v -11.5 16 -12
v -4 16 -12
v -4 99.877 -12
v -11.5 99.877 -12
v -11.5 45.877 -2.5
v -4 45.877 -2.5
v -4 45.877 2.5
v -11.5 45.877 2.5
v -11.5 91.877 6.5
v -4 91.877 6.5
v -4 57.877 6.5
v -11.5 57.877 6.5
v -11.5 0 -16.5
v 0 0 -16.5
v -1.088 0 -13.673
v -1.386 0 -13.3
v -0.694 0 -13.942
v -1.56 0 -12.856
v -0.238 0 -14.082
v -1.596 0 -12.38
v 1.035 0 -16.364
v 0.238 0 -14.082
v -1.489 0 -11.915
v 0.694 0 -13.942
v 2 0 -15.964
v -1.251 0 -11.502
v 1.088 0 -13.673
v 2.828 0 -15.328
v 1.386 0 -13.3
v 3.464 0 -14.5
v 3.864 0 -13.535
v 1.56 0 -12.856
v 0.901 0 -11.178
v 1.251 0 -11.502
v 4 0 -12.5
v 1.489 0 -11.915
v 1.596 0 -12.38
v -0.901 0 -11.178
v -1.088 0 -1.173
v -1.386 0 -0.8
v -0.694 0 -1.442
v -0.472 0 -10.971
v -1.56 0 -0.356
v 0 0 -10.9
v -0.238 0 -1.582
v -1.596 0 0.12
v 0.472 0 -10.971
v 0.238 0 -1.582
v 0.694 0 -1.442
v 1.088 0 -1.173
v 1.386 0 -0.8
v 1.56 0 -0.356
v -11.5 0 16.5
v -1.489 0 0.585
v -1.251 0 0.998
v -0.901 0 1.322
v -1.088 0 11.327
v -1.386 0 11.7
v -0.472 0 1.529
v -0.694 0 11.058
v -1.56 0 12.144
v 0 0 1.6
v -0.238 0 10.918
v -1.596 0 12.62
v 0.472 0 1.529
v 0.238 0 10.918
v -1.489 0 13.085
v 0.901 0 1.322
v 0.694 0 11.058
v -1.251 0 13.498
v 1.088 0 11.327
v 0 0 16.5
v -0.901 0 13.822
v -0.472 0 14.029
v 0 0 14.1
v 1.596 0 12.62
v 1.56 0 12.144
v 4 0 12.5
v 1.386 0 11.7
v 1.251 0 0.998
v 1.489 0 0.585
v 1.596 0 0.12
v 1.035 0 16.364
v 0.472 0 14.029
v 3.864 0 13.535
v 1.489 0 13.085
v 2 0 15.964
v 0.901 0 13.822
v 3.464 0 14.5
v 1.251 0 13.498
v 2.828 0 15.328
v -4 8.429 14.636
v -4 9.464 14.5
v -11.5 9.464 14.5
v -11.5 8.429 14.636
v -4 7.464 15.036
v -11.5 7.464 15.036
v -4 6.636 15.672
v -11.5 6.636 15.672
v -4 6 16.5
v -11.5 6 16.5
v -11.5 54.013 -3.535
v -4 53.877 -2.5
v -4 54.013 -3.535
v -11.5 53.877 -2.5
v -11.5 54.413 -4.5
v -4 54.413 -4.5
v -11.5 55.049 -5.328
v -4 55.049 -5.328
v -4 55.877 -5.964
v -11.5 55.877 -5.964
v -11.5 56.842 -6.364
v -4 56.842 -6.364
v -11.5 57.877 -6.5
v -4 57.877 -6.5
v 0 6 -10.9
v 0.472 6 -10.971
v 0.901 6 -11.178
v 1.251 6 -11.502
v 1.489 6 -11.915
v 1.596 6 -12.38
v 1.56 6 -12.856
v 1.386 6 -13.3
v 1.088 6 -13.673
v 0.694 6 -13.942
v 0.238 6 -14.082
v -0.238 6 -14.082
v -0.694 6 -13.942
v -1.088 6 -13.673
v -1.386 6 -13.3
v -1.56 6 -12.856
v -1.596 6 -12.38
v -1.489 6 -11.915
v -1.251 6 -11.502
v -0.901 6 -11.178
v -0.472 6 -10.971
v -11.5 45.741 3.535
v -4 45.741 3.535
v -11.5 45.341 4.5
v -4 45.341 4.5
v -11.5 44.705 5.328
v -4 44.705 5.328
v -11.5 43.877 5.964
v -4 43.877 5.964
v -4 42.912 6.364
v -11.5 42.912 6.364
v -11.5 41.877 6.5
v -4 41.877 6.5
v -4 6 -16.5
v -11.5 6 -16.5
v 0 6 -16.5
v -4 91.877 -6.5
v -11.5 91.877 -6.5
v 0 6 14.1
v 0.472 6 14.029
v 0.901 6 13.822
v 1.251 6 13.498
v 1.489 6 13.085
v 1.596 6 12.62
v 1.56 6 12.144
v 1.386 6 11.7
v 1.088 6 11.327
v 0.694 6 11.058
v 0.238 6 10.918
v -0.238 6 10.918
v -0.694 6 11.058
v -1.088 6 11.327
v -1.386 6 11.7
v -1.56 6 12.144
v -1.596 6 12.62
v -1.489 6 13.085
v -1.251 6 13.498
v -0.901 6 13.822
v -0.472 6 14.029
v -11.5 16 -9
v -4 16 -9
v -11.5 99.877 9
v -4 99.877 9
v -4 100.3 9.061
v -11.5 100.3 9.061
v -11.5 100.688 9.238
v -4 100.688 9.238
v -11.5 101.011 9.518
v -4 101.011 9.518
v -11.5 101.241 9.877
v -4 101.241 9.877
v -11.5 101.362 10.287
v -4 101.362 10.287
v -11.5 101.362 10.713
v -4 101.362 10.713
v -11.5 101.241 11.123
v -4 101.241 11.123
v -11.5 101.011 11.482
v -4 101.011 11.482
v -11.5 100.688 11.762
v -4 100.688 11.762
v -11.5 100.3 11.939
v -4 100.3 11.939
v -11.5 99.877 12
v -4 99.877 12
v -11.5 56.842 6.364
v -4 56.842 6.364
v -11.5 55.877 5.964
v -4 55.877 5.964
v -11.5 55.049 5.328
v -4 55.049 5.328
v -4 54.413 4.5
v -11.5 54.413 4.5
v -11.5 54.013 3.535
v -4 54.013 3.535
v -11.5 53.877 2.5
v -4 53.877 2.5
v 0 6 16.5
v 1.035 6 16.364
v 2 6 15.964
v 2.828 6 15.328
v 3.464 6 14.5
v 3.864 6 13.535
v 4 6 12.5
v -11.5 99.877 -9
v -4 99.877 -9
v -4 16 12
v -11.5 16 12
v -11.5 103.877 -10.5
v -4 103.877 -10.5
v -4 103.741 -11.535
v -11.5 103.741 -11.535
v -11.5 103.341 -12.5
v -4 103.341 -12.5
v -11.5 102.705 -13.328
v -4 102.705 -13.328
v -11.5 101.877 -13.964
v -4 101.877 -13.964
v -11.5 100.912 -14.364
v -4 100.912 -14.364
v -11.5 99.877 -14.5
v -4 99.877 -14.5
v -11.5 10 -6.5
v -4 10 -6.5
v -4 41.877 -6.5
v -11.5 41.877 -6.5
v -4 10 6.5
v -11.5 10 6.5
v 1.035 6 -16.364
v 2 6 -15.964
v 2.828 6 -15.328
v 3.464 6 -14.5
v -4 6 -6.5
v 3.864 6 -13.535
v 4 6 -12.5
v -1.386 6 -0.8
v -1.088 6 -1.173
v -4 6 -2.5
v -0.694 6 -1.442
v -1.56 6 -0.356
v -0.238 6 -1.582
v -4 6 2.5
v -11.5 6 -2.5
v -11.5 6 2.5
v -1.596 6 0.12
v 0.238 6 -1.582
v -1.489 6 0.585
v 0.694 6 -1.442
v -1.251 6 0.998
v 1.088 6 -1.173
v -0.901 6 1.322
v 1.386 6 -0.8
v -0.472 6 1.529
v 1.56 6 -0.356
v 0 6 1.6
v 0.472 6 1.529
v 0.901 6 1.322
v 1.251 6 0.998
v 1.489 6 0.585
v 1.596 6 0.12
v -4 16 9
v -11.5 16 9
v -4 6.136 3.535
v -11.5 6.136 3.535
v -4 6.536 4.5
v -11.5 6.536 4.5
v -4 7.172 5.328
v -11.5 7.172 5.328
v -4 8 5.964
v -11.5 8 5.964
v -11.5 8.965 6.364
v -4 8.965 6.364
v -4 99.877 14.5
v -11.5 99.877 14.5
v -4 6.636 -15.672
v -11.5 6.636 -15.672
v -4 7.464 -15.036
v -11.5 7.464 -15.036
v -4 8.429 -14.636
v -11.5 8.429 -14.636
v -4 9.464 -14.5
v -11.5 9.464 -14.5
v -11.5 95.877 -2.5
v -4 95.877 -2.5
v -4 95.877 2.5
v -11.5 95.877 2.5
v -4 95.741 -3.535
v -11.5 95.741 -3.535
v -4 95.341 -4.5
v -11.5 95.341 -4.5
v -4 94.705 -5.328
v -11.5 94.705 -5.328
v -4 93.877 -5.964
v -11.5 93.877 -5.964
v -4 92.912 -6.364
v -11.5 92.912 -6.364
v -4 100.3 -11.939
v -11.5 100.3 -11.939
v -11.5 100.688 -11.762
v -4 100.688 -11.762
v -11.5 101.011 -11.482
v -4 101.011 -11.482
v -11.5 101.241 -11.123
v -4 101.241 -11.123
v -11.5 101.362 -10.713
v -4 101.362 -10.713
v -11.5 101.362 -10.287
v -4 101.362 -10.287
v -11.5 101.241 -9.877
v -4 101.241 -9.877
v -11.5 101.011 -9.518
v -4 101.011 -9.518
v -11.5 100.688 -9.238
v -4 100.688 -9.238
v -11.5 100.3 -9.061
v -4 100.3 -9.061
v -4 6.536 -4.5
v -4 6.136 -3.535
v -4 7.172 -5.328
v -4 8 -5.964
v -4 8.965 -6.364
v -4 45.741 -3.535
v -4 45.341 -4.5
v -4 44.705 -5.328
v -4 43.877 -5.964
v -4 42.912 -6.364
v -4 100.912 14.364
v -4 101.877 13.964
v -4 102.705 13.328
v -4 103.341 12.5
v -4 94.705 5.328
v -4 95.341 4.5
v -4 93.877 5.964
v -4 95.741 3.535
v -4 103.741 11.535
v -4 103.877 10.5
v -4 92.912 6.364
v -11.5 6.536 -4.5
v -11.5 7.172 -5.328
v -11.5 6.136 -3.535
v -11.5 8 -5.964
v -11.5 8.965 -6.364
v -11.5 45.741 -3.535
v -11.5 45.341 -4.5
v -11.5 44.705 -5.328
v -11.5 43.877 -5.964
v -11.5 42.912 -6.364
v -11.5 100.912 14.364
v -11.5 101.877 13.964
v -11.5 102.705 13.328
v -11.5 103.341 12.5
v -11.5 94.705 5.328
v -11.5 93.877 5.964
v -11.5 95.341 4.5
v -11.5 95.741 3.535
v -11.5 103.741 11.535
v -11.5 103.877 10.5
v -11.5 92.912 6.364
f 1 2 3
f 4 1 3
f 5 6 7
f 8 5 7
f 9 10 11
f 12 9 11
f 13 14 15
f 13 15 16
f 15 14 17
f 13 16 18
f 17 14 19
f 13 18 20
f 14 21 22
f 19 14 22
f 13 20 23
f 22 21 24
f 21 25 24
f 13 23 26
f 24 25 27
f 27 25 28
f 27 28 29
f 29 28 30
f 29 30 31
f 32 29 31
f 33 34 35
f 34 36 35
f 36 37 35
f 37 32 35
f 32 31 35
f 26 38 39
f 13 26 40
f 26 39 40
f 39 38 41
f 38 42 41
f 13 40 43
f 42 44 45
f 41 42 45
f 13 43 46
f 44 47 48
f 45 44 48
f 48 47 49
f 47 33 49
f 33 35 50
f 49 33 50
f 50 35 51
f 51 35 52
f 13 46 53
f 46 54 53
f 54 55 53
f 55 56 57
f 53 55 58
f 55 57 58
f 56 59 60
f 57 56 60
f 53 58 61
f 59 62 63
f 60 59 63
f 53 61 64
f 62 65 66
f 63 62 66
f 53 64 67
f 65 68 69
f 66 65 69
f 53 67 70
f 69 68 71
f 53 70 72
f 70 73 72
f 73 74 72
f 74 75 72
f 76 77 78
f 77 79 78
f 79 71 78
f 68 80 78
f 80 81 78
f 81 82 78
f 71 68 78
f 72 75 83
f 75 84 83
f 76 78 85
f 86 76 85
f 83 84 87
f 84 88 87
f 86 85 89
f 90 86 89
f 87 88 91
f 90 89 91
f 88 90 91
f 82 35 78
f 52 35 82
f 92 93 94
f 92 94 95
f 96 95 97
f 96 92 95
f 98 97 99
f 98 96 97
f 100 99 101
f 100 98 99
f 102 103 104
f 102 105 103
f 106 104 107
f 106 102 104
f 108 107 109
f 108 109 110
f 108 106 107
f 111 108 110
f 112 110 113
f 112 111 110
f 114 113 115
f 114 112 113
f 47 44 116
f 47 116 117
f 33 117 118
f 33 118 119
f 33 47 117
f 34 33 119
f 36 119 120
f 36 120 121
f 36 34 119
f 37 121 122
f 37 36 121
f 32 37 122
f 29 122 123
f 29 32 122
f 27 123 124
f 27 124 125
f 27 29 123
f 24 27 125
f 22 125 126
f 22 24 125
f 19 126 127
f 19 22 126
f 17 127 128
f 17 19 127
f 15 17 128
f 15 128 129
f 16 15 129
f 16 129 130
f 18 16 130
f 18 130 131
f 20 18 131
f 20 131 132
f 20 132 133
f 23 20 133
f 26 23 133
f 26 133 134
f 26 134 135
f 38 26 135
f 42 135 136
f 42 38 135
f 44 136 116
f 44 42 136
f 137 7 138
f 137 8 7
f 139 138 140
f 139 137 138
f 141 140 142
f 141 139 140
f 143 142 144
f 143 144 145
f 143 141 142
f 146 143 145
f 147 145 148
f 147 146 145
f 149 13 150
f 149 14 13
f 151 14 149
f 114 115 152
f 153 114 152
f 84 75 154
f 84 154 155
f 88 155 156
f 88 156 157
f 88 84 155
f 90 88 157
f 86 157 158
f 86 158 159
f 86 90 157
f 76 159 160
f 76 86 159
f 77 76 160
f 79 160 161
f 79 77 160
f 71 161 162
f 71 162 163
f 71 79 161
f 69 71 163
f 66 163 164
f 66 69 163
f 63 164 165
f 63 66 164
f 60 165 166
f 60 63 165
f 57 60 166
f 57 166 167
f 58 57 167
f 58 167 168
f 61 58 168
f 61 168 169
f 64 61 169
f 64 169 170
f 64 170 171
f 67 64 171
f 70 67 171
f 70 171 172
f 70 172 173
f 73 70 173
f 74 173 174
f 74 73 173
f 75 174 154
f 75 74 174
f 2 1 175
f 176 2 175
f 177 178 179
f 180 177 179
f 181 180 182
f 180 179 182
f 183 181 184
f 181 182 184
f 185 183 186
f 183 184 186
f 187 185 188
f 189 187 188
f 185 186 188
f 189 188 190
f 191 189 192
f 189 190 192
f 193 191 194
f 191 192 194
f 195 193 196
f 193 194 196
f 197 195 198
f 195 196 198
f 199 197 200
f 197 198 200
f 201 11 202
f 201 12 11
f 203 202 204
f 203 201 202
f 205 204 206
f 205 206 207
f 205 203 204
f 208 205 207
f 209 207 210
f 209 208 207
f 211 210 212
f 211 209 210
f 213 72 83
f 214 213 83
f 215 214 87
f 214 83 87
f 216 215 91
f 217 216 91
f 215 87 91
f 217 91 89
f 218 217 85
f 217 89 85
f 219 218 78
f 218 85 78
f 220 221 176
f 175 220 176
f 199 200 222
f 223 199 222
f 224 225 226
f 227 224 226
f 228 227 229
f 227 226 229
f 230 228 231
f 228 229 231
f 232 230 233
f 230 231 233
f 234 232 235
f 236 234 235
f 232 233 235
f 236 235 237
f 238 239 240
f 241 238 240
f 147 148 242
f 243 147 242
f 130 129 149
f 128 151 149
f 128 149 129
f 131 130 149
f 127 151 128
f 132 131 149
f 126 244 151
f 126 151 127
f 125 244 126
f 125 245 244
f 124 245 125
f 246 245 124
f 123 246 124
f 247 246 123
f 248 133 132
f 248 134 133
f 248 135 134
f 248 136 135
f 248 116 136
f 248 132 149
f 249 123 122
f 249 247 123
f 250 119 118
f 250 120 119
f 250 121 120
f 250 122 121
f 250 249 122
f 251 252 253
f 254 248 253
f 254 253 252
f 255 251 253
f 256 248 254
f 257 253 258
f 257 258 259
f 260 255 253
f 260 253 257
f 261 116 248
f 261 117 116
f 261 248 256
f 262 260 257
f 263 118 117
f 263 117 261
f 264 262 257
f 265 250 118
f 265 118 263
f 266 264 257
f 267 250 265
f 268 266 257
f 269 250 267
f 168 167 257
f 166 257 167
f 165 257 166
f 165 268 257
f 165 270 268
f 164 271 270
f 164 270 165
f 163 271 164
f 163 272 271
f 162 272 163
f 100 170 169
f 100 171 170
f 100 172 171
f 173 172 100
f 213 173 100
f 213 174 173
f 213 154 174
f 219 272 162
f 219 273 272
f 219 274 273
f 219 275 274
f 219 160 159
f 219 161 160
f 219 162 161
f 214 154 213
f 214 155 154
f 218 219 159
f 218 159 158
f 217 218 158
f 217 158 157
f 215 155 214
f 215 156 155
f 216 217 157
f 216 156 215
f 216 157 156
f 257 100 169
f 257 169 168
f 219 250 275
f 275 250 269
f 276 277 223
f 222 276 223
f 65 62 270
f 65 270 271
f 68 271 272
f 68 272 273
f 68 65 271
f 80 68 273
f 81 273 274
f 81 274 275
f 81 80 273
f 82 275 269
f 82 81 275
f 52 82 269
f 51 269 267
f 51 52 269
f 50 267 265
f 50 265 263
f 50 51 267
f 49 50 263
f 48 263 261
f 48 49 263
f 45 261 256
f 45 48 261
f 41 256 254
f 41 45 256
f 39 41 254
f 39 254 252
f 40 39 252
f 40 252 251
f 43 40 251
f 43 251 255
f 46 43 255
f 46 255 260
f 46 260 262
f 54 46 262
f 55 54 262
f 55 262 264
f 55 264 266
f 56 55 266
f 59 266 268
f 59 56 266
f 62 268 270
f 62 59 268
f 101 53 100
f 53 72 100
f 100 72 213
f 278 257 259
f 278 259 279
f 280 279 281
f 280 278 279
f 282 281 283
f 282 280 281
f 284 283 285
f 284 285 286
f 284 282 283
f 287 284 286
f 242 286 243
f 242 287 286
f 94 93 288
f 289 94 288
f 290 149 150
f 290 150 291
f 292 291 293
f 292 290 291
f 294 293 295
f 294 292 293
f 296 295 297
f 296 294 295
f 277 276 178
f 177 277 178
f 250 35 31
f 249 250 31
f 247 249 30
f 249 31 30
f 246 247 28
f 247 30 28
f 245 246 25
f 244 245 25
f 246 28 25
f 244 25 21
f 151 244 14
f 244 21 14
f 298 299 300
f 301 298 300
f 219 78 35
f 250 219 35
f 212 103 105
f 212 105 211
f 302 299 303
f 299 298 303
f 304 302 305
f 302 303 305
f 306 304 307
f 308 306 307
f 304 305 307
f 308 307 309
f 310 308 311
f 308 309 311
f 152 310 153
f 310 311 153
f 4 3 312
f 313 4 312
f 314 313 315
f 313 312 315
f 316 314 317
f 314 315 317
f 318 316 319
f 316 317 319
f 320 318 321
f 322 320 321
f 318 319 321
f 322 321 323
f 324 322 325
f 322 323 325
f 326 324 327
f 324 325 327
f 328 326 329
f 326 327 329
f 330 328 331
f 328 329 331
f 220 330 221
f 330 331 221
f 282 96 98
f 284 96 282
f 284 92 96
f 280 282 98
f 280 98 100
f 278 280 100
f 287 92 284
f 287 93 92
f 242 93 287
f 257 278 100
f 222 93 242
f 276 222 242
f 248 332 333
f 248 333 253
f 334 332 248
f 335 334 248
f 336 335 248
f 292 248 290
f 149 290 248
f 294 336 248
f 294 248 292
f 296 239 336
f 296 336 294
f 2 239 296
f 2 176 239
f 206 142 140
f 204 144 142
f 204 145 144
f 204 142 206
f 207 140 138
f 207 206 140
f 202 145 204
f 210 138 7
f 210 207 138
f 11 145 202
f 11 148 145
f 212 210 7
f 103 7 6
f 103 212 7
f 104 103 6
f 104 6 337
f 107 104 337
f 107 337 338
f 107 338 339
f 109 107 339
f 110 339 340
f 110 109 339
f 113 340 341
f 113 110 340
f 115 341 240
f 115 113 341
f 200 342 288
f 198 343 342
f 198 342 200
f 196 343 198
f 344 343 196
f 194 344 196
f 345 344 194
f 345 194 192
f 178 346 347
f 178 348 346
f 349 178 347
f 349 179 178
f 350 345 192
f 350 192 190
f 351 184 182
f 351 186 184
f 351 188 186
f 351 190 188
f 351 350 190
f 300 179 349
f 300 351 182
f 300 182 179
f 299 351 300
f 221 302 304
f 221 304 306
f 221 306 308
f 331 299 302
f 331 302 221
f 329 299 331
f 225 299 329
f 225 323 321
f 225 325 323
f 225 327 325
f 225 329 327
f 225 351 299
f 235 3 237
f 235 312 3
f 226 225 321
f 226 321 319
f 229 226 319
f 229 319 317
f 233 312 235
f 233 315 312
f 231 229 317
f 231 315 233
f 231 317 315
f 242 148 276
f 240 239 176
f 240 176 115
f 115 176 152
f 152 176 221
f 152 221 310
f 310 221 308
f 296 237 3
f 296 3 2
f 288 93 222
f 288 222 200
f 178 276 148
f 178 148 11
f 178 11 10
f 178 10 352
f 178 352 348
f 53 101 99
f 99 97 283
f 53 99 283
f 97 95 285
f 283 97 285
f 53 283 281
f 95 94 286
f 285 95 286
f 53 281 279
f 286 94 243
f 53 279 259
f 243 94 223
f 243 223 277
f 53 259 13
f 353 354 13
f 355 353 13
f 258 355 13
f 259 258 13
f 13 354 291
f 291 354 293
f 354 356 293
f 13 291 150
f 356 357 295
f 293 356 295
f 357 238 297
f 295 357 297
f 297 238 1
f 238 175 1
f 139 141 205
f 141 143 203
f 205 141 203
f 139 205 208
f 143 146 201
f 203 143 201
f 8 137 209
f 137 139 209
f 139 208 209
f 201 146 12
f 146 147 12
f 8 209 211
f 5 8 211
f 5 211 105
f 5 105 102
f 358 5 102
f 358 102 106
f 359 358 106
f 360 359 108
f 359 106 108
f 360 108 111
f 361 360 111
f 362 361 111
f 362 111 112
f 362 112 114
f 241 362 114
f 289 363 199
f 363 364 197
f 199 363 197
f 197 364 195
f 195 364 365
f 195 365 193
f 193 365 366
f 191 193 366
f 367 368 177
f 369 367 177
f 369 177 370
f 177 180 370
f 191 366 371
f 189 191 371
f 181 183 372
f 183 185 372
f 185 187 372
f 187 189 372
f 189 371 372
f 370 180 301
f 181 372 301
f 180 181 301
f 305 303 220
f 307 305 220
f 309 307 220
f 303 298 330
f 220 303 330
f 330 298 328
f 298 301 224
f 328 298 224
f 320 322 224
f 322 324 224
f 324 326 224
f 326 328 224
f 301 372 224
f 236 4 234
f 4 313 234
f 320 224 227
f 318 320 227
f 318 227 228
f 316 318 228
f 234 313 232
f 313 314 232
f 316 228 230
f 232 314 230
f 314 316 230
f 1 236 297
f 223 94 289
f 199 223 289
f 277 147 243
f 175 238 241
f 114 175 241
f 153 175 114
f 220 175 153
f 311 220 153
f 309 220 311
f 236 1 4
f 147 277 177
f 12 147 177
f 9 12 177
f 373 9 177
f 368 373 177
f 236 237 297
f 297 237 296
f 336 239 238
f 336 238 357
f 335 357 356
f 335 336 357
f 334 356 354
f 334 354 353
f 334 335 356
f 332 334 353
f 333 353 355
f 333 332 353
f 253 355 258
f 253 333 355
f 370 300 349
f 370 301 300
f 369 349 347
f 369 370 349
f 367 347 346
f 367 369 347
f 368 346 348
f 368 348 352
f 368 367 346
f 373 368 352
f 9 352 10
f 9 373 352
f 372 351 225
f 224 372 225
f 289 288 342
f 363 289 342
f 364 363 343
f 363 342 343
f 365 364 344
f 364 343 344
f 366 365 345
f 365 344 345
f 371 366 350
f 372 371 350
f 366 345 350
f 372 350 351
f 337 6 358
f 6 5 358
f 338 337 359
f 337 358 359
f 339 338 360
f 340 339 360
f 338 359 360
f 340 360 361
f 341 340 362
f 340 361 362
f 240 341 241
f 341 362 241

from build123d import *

# Parameters (mm, degrees)
SKETCH1_R           = 1.6
BOSS_EXTRUDE1_DEPTH = 6
SKETCH2_W           = 2.5
SKETCH2_H           = 42
SKETCH2_H_2         = 8
SKETCH2_H_3         = 6
SKETCH2_W_2         = 13
SKETCH2_W_3         = 2
SKETCH2_W_4         = 3
SKETCH2_H_4         = 10
BOSS_EXTRUDE2_DEPTH = 7.5
FILLET3_R           = 4
FILLET4_R           = 4


with BuildPart() as part:
    # Sketch1 → Boss-Extrude1 (new body)
    with BuildSketch(Plane(origin=(0, 0, 0), x_dir=(1, 0, 0), z_dir=(0, 1, 0))):
        with BuildLine():
            Line((-4, -16.5), (0, -16.5))
            ThreePointArc((0, -16.5), (2.828427125, -15.328427125), (4, -12.5))
            Line((4, -12.5), (4, 12.5))
            ThreePointArc((4, 12.5), (2.828427125, 15.328427125), (0, 16.5))
            Line((0, 16.5), (-4, 16.5))
            Line((-4, 16.5), (-4, -16.5))
        make_face()
        with Locations(Location((0, 12.5, 0), (0, 0, 270))):
            Circle(SKETCH1_R, mode=Mode.SUBTRACT)
        with Locations(Location((0, -12.5, 0), (0, 0, 270))):
            Circle(SKETCH1_R, mode=Mode.SUBTRACT)
        with Locations(Location((0, 0, 0), (0, 0, 270))):
            Circle(SKETCH1_R, mode=Mode.SUBTRACT)
    extrude(amount=BOSS_EXTRUDE1_DEPTH)

    # Sketch2 → Boss-Extrude2 (add)
    with BuildSketch(Plane.ZY.offset(4)):
        with BuildLine():
            Line((14.5, 49.877005851), (14.5, 99.877005851))
            ThreePointArc((14.5, 99.877005851), (13.81662479, 97.640937873), (12, 96.168906607))
            Line((12, 96.168906607), (12, 53.585105094))
            ThreePointArc((12, 53.585105094), (13.81662479, 52.113073828), (14.5, 49.877005851))
        make_face()
        with Locations((7.75, 74.877005851)):
            Rectangle(SKETCH2_W, SKETCH2_H)
        with BuildLine():
            ThreePointArc((14.5, 99.877005851), (13.328427125, 102.705432976), (10.5, 103.877005851))
            ThreePointArc((10.5, 103.877005851), (7.671572875, 102.705432976), (6.5, 99.877005851))
            Line((6.5, 99.877005851), (6.5, 95.877005851))
            Line((6.5, 95.877005851), (9, 95.877005851))
            Line((9, 95.877005851), (9, 99.877005851))
            ThreePointArc((9, 99.877005851), (10.5, 101.377005851), (12, 99.877005851))
            Line((12, 99.877005851), (12, 96.168906607))
            ThreePointArc((12, 96.168906607), (13.81662479, 97.640937873), (14.5, 99.877005851))
        make_face()
        with BuildLine():
            Line((10.5, 103.877005851), (-10.5, 103.877005851))
            ThreePointArc((-10.5, 103.877005851), (-7.671572875, 102.705432976), (-6.5, 99.877005851))
            Line((-6.5, 99.877005851), (-6.5, 95.877005851))
            Line((-6.5, 95.877005851), (6.5, 95.877005851))
            Line((6.5, 95.877005851), (6.5, 99.877005851))
            ThreePointArc((6.5, 99.877005851), (7.671572875, 102.705432976), (10.5, 103.877005851))
        make_face()
        with BuildLine():
            ThreePointArc((-10.5, 103.877005851), (-13.328427125, 102.705432976), (-14.5, 99.877005851))
            ThreePointArc((-14.5, 99.877005851), (-13.81662479, 97.640937873), (-12, 96.168906607))
            Line((-12, 96.168906607), (-12, 99.877005851))
            ThreePointArc((-12, 99.877005851), (-10.5, 101.377005851), (-9, 99.877005851))
            Line((-9, 99.877005851), (-9, 95.877005851))
            Line((-9, 95.877005851), (-6.5, 95.877005851))
            Line((-6.5, 95.877005851), (-6.5, 99.877005851))
            ThreePointArc((-6.5, 99.877005851), (-7.671572875, 102.705432976), (-10.5, 103.877005851))
        make_face()
        with BuildLine():
            Line((-14.5, 99.877005851), (-14.5, 49.877005807))
            ThreePointArc((-14.5, 49.877005807), (-13.816624803, 52.11307381), (-12, 53.585105094))
            Line((-12, 53.585105094), (-12, 96.168906607))
            ThreePointArc((-12, 96.168906607), (-13.81662479, 97.640937873), (-14.5, 99.877005851))
        make_face()
        with Locations((-7.75, 74.877005851)):
            Rectangle(SKETCH2_W, SKETCH2_H)
        with Locations((7.75, 49.877005851)):
            Rectangle(SKETCH2_W, SKETCH2_H_2)
        with BuildLine():
            ThreePointArc((12, 46.168906607), (13.81662479, 47.640937873), (14.5, 49.877005851))
            ThreePointArc((14.5, 49.877005851), (13.81662479, 52.113073828), (12, 53.585105094))
            Line((12, 53.585105094), (12, 46.168906607))
        make_face()
        with Locations((-7.75, 49.877005851)):
            Rectangle(SKETCH2_W, SKETCH2_H_2)
        with BuildLine():
            ThreePointArc((-12, 53.585105094), (-13.816624803, 52.11307381), (-14.5, 49.877005807))
            ThreePointArc((-14.5, 49.877005807), (-13.816624778, 47.640937855), (-12, 46.168906607))
            Line((-12, 46.168906607), (-12, 53.585105094))
        make_face()
        with BuildLine():
            Line((-14.5, 49.877005807), (-14.5, 6))
            Line((-14.5, 6), (-12, 6))
            Line((-12, 6), (-12, 16))
            Line((-12, 16), (-12, 46.168906607))
            ThreePointArc((-12, 46.168906607), (-13.816624778, 47.640937855), (-14.5, 49.877005807))
        make_face()
        with BuildLine():
            Line((12, 16), (12, 6))
            Line((12, 6), (14.5, 6))
            Line((14.5, 6), (14.5, 49.877005851))
            ThreePointArc((14.5, 49.877005851), (13.81662479, 47.640937873), (12, 46.168906607))
            Line((12, 46.168906607), (12, 16))
        make_face()
        Polygon((6.5, 45.877005851), (6.5, 6), (9, 6), (9, 16), (9, 45.877005851), align=None)
        with Locations((13.25, 3)):
            Rectangle(SKETCH2_W, SKETCH2_H_3)
        with Locations((7.75, 3)):
            Rectangle(SKETCH2_W, SKETCH2_H_3)
        with Locations((-7.75, 3)):
            Rectangle(SKETCH2_W, SKETCH2_H_3)
        with Locations((-13.25, 3)):
            Rectangle(SKETCH2_W, SKETCH2_H_3)
        Polygon((-9, 6), (-6.5, 6), (-6.5, 45.877005851), (-9, 45.877005851), (-9, 16), align=None)
        with Locations((0, 3)):
            Rectangle(SKETCH2_W_2, SKETCH2_H_3)
        with Locations((-15.5, 3)):
            Rectangle(SKETCH2_W_3, SKETCH2_H_3)
        with Locations((-10.5, 3)):
            Rectangle(SKETCH2_W_4, SKETCH2_H_3)
        with Locations((15.5, 3)):
            Rectangle(SKETCH2_W_3, SKETCH2_H_3)
        with Locations((10.5, 3)):
            Rectangle(SKETCH2_W_4, SKETCH2_H_3)
        with Locations((0, 49.877005851)):
            Rectangle(SKETCH2_W_2, SKETCH2_H_2)
        with Locations((-10.5, 11)):
            Rectangle(SKETCH2_W_4, SKETCH2_H_4)
        with Locations((10.5, 11)):
            Rectangle(SKETCH2_W_4, SKETCH2_H_4)
    extrude(amount=BOSS_EXTRUDE2_DEPTH)

    # Fillet3
    # the kernel refuses this fillet: 4 mm, written as the material it adds along each edge
    with BuildSketch(Plane(origin=(-4, 6, 6.5), x_dir=(0, 0, -1), z_dir=(-1, 0, 0))) as fillet3_piece_1:
        with BuildLine():
            CenterArc((FILLET3_R, -FILLET3_R), FILLET3_R, 90, 90)
            Line((0, -FILLET3_R), (-FILLET3_R * 0.02, -FILLET3_R))
            Line((-FILLET3_R * 0.02, -FILLET3_R), (-FILLET3_R * 0.02, FILLET3_R * 0.02))
            Line((-FILLET3_R * 0.02, FILLET3_R * 0.02), (FILLET3_R, FILLET3_R * 0.02))
            Line((FILLET3_R, FILLET3_R * 0.02), (FILLET3_R, 0))
        make_face()
    extrude(amount=7.5)
    with BuildSketch(Plane(origin=(-4, 6, -14.5), x_dir=(0, 0, -1), z_dir=(-1, 0, 0))) as fillet3_piece_2:
        with BuildLine():
            CenterArc((4, -3.464101615), FILLET3_R, 120, 60)
            Line((0, -3.464101615), (-0.08, -3.464101615))
            Line((-0.08, -3.464101615), (-0.08, 0))
            Line((-0.08, 0), (0, 0.08))
            ThreePointArc((0, 0.08), (1, 0.08), (1.96, 0.069282032))
            Line((1.96, 0.069282032), (2, 0))
        make_face()
    extrude(amount=7.5)
    with BuildSketch(Plane(origin=(-4, 6, 14.5), x_dir=(0, 0, 1), z_dir=(-1, 0, 0))) as fillet3_piece_3:
        with BuildLine():
            CenterArc((4, 3.464101615), FILLET3_R, 180, 60)
            Line((0, 3.464101615), (-0.08, 3.464101615))
            Line((-0.08, 3.464101615), (-0.08, 0))
            Line((-0.08, 0), (0, -0.08))
            ThreePointArc((0, -0.08), (1, -0.08), (1.96, -0.069282032))
            Line((1.96, -0.069282032), (2, 0))
        make_face()
    extrude(amount=7.5)
    with BuildSketch(Plane(origin=(-4, 6, -6.5), x_dir=(0, 0, 1), z_dir=(-1, 0, 0))) as fillet3_piece_4:
        with BuildLine():
            CenterArc((FILLET3_R, FILLET3_R), FILLET3_R, 180, 90)
            Line((0, FILLET3_R), (-FILLET3_R * 0.02, FILLET3_R))
            Line((-FILLET3_R * 0.02, FILLET3_R), (-FILLET3_R * 0.02, -FILLET3_R * 0.02))
            Line((-FILLET3_R * 0.02, -FILLET3_R * 0.02), (FILLET3_R, -FILLET3_R * 0.02))
            Line((FILLET3_R, -FILLET3_R * 0.02), (FILLET3_R, 0))
        make_face()
    extrude(amount=7.5)

    # Fillet4
    fillet4_edges = [part.edges().sort_by_distance(p)[0] for p in [
        (-7.75, 45.877005851, -6.5),
        (-7.75, 45.877005851, 6.5),
        (-7.75, 95.877005851, -6.5),
        (-7.75, 95.877005851, 6.5),
        (-7.75, 53.877005851, 6.5),
        (-7.75, 53.877005851, -6.5),
    ]]
    fillet(fillet4_edges, radius=FILLET4_R)


solid = part.part
